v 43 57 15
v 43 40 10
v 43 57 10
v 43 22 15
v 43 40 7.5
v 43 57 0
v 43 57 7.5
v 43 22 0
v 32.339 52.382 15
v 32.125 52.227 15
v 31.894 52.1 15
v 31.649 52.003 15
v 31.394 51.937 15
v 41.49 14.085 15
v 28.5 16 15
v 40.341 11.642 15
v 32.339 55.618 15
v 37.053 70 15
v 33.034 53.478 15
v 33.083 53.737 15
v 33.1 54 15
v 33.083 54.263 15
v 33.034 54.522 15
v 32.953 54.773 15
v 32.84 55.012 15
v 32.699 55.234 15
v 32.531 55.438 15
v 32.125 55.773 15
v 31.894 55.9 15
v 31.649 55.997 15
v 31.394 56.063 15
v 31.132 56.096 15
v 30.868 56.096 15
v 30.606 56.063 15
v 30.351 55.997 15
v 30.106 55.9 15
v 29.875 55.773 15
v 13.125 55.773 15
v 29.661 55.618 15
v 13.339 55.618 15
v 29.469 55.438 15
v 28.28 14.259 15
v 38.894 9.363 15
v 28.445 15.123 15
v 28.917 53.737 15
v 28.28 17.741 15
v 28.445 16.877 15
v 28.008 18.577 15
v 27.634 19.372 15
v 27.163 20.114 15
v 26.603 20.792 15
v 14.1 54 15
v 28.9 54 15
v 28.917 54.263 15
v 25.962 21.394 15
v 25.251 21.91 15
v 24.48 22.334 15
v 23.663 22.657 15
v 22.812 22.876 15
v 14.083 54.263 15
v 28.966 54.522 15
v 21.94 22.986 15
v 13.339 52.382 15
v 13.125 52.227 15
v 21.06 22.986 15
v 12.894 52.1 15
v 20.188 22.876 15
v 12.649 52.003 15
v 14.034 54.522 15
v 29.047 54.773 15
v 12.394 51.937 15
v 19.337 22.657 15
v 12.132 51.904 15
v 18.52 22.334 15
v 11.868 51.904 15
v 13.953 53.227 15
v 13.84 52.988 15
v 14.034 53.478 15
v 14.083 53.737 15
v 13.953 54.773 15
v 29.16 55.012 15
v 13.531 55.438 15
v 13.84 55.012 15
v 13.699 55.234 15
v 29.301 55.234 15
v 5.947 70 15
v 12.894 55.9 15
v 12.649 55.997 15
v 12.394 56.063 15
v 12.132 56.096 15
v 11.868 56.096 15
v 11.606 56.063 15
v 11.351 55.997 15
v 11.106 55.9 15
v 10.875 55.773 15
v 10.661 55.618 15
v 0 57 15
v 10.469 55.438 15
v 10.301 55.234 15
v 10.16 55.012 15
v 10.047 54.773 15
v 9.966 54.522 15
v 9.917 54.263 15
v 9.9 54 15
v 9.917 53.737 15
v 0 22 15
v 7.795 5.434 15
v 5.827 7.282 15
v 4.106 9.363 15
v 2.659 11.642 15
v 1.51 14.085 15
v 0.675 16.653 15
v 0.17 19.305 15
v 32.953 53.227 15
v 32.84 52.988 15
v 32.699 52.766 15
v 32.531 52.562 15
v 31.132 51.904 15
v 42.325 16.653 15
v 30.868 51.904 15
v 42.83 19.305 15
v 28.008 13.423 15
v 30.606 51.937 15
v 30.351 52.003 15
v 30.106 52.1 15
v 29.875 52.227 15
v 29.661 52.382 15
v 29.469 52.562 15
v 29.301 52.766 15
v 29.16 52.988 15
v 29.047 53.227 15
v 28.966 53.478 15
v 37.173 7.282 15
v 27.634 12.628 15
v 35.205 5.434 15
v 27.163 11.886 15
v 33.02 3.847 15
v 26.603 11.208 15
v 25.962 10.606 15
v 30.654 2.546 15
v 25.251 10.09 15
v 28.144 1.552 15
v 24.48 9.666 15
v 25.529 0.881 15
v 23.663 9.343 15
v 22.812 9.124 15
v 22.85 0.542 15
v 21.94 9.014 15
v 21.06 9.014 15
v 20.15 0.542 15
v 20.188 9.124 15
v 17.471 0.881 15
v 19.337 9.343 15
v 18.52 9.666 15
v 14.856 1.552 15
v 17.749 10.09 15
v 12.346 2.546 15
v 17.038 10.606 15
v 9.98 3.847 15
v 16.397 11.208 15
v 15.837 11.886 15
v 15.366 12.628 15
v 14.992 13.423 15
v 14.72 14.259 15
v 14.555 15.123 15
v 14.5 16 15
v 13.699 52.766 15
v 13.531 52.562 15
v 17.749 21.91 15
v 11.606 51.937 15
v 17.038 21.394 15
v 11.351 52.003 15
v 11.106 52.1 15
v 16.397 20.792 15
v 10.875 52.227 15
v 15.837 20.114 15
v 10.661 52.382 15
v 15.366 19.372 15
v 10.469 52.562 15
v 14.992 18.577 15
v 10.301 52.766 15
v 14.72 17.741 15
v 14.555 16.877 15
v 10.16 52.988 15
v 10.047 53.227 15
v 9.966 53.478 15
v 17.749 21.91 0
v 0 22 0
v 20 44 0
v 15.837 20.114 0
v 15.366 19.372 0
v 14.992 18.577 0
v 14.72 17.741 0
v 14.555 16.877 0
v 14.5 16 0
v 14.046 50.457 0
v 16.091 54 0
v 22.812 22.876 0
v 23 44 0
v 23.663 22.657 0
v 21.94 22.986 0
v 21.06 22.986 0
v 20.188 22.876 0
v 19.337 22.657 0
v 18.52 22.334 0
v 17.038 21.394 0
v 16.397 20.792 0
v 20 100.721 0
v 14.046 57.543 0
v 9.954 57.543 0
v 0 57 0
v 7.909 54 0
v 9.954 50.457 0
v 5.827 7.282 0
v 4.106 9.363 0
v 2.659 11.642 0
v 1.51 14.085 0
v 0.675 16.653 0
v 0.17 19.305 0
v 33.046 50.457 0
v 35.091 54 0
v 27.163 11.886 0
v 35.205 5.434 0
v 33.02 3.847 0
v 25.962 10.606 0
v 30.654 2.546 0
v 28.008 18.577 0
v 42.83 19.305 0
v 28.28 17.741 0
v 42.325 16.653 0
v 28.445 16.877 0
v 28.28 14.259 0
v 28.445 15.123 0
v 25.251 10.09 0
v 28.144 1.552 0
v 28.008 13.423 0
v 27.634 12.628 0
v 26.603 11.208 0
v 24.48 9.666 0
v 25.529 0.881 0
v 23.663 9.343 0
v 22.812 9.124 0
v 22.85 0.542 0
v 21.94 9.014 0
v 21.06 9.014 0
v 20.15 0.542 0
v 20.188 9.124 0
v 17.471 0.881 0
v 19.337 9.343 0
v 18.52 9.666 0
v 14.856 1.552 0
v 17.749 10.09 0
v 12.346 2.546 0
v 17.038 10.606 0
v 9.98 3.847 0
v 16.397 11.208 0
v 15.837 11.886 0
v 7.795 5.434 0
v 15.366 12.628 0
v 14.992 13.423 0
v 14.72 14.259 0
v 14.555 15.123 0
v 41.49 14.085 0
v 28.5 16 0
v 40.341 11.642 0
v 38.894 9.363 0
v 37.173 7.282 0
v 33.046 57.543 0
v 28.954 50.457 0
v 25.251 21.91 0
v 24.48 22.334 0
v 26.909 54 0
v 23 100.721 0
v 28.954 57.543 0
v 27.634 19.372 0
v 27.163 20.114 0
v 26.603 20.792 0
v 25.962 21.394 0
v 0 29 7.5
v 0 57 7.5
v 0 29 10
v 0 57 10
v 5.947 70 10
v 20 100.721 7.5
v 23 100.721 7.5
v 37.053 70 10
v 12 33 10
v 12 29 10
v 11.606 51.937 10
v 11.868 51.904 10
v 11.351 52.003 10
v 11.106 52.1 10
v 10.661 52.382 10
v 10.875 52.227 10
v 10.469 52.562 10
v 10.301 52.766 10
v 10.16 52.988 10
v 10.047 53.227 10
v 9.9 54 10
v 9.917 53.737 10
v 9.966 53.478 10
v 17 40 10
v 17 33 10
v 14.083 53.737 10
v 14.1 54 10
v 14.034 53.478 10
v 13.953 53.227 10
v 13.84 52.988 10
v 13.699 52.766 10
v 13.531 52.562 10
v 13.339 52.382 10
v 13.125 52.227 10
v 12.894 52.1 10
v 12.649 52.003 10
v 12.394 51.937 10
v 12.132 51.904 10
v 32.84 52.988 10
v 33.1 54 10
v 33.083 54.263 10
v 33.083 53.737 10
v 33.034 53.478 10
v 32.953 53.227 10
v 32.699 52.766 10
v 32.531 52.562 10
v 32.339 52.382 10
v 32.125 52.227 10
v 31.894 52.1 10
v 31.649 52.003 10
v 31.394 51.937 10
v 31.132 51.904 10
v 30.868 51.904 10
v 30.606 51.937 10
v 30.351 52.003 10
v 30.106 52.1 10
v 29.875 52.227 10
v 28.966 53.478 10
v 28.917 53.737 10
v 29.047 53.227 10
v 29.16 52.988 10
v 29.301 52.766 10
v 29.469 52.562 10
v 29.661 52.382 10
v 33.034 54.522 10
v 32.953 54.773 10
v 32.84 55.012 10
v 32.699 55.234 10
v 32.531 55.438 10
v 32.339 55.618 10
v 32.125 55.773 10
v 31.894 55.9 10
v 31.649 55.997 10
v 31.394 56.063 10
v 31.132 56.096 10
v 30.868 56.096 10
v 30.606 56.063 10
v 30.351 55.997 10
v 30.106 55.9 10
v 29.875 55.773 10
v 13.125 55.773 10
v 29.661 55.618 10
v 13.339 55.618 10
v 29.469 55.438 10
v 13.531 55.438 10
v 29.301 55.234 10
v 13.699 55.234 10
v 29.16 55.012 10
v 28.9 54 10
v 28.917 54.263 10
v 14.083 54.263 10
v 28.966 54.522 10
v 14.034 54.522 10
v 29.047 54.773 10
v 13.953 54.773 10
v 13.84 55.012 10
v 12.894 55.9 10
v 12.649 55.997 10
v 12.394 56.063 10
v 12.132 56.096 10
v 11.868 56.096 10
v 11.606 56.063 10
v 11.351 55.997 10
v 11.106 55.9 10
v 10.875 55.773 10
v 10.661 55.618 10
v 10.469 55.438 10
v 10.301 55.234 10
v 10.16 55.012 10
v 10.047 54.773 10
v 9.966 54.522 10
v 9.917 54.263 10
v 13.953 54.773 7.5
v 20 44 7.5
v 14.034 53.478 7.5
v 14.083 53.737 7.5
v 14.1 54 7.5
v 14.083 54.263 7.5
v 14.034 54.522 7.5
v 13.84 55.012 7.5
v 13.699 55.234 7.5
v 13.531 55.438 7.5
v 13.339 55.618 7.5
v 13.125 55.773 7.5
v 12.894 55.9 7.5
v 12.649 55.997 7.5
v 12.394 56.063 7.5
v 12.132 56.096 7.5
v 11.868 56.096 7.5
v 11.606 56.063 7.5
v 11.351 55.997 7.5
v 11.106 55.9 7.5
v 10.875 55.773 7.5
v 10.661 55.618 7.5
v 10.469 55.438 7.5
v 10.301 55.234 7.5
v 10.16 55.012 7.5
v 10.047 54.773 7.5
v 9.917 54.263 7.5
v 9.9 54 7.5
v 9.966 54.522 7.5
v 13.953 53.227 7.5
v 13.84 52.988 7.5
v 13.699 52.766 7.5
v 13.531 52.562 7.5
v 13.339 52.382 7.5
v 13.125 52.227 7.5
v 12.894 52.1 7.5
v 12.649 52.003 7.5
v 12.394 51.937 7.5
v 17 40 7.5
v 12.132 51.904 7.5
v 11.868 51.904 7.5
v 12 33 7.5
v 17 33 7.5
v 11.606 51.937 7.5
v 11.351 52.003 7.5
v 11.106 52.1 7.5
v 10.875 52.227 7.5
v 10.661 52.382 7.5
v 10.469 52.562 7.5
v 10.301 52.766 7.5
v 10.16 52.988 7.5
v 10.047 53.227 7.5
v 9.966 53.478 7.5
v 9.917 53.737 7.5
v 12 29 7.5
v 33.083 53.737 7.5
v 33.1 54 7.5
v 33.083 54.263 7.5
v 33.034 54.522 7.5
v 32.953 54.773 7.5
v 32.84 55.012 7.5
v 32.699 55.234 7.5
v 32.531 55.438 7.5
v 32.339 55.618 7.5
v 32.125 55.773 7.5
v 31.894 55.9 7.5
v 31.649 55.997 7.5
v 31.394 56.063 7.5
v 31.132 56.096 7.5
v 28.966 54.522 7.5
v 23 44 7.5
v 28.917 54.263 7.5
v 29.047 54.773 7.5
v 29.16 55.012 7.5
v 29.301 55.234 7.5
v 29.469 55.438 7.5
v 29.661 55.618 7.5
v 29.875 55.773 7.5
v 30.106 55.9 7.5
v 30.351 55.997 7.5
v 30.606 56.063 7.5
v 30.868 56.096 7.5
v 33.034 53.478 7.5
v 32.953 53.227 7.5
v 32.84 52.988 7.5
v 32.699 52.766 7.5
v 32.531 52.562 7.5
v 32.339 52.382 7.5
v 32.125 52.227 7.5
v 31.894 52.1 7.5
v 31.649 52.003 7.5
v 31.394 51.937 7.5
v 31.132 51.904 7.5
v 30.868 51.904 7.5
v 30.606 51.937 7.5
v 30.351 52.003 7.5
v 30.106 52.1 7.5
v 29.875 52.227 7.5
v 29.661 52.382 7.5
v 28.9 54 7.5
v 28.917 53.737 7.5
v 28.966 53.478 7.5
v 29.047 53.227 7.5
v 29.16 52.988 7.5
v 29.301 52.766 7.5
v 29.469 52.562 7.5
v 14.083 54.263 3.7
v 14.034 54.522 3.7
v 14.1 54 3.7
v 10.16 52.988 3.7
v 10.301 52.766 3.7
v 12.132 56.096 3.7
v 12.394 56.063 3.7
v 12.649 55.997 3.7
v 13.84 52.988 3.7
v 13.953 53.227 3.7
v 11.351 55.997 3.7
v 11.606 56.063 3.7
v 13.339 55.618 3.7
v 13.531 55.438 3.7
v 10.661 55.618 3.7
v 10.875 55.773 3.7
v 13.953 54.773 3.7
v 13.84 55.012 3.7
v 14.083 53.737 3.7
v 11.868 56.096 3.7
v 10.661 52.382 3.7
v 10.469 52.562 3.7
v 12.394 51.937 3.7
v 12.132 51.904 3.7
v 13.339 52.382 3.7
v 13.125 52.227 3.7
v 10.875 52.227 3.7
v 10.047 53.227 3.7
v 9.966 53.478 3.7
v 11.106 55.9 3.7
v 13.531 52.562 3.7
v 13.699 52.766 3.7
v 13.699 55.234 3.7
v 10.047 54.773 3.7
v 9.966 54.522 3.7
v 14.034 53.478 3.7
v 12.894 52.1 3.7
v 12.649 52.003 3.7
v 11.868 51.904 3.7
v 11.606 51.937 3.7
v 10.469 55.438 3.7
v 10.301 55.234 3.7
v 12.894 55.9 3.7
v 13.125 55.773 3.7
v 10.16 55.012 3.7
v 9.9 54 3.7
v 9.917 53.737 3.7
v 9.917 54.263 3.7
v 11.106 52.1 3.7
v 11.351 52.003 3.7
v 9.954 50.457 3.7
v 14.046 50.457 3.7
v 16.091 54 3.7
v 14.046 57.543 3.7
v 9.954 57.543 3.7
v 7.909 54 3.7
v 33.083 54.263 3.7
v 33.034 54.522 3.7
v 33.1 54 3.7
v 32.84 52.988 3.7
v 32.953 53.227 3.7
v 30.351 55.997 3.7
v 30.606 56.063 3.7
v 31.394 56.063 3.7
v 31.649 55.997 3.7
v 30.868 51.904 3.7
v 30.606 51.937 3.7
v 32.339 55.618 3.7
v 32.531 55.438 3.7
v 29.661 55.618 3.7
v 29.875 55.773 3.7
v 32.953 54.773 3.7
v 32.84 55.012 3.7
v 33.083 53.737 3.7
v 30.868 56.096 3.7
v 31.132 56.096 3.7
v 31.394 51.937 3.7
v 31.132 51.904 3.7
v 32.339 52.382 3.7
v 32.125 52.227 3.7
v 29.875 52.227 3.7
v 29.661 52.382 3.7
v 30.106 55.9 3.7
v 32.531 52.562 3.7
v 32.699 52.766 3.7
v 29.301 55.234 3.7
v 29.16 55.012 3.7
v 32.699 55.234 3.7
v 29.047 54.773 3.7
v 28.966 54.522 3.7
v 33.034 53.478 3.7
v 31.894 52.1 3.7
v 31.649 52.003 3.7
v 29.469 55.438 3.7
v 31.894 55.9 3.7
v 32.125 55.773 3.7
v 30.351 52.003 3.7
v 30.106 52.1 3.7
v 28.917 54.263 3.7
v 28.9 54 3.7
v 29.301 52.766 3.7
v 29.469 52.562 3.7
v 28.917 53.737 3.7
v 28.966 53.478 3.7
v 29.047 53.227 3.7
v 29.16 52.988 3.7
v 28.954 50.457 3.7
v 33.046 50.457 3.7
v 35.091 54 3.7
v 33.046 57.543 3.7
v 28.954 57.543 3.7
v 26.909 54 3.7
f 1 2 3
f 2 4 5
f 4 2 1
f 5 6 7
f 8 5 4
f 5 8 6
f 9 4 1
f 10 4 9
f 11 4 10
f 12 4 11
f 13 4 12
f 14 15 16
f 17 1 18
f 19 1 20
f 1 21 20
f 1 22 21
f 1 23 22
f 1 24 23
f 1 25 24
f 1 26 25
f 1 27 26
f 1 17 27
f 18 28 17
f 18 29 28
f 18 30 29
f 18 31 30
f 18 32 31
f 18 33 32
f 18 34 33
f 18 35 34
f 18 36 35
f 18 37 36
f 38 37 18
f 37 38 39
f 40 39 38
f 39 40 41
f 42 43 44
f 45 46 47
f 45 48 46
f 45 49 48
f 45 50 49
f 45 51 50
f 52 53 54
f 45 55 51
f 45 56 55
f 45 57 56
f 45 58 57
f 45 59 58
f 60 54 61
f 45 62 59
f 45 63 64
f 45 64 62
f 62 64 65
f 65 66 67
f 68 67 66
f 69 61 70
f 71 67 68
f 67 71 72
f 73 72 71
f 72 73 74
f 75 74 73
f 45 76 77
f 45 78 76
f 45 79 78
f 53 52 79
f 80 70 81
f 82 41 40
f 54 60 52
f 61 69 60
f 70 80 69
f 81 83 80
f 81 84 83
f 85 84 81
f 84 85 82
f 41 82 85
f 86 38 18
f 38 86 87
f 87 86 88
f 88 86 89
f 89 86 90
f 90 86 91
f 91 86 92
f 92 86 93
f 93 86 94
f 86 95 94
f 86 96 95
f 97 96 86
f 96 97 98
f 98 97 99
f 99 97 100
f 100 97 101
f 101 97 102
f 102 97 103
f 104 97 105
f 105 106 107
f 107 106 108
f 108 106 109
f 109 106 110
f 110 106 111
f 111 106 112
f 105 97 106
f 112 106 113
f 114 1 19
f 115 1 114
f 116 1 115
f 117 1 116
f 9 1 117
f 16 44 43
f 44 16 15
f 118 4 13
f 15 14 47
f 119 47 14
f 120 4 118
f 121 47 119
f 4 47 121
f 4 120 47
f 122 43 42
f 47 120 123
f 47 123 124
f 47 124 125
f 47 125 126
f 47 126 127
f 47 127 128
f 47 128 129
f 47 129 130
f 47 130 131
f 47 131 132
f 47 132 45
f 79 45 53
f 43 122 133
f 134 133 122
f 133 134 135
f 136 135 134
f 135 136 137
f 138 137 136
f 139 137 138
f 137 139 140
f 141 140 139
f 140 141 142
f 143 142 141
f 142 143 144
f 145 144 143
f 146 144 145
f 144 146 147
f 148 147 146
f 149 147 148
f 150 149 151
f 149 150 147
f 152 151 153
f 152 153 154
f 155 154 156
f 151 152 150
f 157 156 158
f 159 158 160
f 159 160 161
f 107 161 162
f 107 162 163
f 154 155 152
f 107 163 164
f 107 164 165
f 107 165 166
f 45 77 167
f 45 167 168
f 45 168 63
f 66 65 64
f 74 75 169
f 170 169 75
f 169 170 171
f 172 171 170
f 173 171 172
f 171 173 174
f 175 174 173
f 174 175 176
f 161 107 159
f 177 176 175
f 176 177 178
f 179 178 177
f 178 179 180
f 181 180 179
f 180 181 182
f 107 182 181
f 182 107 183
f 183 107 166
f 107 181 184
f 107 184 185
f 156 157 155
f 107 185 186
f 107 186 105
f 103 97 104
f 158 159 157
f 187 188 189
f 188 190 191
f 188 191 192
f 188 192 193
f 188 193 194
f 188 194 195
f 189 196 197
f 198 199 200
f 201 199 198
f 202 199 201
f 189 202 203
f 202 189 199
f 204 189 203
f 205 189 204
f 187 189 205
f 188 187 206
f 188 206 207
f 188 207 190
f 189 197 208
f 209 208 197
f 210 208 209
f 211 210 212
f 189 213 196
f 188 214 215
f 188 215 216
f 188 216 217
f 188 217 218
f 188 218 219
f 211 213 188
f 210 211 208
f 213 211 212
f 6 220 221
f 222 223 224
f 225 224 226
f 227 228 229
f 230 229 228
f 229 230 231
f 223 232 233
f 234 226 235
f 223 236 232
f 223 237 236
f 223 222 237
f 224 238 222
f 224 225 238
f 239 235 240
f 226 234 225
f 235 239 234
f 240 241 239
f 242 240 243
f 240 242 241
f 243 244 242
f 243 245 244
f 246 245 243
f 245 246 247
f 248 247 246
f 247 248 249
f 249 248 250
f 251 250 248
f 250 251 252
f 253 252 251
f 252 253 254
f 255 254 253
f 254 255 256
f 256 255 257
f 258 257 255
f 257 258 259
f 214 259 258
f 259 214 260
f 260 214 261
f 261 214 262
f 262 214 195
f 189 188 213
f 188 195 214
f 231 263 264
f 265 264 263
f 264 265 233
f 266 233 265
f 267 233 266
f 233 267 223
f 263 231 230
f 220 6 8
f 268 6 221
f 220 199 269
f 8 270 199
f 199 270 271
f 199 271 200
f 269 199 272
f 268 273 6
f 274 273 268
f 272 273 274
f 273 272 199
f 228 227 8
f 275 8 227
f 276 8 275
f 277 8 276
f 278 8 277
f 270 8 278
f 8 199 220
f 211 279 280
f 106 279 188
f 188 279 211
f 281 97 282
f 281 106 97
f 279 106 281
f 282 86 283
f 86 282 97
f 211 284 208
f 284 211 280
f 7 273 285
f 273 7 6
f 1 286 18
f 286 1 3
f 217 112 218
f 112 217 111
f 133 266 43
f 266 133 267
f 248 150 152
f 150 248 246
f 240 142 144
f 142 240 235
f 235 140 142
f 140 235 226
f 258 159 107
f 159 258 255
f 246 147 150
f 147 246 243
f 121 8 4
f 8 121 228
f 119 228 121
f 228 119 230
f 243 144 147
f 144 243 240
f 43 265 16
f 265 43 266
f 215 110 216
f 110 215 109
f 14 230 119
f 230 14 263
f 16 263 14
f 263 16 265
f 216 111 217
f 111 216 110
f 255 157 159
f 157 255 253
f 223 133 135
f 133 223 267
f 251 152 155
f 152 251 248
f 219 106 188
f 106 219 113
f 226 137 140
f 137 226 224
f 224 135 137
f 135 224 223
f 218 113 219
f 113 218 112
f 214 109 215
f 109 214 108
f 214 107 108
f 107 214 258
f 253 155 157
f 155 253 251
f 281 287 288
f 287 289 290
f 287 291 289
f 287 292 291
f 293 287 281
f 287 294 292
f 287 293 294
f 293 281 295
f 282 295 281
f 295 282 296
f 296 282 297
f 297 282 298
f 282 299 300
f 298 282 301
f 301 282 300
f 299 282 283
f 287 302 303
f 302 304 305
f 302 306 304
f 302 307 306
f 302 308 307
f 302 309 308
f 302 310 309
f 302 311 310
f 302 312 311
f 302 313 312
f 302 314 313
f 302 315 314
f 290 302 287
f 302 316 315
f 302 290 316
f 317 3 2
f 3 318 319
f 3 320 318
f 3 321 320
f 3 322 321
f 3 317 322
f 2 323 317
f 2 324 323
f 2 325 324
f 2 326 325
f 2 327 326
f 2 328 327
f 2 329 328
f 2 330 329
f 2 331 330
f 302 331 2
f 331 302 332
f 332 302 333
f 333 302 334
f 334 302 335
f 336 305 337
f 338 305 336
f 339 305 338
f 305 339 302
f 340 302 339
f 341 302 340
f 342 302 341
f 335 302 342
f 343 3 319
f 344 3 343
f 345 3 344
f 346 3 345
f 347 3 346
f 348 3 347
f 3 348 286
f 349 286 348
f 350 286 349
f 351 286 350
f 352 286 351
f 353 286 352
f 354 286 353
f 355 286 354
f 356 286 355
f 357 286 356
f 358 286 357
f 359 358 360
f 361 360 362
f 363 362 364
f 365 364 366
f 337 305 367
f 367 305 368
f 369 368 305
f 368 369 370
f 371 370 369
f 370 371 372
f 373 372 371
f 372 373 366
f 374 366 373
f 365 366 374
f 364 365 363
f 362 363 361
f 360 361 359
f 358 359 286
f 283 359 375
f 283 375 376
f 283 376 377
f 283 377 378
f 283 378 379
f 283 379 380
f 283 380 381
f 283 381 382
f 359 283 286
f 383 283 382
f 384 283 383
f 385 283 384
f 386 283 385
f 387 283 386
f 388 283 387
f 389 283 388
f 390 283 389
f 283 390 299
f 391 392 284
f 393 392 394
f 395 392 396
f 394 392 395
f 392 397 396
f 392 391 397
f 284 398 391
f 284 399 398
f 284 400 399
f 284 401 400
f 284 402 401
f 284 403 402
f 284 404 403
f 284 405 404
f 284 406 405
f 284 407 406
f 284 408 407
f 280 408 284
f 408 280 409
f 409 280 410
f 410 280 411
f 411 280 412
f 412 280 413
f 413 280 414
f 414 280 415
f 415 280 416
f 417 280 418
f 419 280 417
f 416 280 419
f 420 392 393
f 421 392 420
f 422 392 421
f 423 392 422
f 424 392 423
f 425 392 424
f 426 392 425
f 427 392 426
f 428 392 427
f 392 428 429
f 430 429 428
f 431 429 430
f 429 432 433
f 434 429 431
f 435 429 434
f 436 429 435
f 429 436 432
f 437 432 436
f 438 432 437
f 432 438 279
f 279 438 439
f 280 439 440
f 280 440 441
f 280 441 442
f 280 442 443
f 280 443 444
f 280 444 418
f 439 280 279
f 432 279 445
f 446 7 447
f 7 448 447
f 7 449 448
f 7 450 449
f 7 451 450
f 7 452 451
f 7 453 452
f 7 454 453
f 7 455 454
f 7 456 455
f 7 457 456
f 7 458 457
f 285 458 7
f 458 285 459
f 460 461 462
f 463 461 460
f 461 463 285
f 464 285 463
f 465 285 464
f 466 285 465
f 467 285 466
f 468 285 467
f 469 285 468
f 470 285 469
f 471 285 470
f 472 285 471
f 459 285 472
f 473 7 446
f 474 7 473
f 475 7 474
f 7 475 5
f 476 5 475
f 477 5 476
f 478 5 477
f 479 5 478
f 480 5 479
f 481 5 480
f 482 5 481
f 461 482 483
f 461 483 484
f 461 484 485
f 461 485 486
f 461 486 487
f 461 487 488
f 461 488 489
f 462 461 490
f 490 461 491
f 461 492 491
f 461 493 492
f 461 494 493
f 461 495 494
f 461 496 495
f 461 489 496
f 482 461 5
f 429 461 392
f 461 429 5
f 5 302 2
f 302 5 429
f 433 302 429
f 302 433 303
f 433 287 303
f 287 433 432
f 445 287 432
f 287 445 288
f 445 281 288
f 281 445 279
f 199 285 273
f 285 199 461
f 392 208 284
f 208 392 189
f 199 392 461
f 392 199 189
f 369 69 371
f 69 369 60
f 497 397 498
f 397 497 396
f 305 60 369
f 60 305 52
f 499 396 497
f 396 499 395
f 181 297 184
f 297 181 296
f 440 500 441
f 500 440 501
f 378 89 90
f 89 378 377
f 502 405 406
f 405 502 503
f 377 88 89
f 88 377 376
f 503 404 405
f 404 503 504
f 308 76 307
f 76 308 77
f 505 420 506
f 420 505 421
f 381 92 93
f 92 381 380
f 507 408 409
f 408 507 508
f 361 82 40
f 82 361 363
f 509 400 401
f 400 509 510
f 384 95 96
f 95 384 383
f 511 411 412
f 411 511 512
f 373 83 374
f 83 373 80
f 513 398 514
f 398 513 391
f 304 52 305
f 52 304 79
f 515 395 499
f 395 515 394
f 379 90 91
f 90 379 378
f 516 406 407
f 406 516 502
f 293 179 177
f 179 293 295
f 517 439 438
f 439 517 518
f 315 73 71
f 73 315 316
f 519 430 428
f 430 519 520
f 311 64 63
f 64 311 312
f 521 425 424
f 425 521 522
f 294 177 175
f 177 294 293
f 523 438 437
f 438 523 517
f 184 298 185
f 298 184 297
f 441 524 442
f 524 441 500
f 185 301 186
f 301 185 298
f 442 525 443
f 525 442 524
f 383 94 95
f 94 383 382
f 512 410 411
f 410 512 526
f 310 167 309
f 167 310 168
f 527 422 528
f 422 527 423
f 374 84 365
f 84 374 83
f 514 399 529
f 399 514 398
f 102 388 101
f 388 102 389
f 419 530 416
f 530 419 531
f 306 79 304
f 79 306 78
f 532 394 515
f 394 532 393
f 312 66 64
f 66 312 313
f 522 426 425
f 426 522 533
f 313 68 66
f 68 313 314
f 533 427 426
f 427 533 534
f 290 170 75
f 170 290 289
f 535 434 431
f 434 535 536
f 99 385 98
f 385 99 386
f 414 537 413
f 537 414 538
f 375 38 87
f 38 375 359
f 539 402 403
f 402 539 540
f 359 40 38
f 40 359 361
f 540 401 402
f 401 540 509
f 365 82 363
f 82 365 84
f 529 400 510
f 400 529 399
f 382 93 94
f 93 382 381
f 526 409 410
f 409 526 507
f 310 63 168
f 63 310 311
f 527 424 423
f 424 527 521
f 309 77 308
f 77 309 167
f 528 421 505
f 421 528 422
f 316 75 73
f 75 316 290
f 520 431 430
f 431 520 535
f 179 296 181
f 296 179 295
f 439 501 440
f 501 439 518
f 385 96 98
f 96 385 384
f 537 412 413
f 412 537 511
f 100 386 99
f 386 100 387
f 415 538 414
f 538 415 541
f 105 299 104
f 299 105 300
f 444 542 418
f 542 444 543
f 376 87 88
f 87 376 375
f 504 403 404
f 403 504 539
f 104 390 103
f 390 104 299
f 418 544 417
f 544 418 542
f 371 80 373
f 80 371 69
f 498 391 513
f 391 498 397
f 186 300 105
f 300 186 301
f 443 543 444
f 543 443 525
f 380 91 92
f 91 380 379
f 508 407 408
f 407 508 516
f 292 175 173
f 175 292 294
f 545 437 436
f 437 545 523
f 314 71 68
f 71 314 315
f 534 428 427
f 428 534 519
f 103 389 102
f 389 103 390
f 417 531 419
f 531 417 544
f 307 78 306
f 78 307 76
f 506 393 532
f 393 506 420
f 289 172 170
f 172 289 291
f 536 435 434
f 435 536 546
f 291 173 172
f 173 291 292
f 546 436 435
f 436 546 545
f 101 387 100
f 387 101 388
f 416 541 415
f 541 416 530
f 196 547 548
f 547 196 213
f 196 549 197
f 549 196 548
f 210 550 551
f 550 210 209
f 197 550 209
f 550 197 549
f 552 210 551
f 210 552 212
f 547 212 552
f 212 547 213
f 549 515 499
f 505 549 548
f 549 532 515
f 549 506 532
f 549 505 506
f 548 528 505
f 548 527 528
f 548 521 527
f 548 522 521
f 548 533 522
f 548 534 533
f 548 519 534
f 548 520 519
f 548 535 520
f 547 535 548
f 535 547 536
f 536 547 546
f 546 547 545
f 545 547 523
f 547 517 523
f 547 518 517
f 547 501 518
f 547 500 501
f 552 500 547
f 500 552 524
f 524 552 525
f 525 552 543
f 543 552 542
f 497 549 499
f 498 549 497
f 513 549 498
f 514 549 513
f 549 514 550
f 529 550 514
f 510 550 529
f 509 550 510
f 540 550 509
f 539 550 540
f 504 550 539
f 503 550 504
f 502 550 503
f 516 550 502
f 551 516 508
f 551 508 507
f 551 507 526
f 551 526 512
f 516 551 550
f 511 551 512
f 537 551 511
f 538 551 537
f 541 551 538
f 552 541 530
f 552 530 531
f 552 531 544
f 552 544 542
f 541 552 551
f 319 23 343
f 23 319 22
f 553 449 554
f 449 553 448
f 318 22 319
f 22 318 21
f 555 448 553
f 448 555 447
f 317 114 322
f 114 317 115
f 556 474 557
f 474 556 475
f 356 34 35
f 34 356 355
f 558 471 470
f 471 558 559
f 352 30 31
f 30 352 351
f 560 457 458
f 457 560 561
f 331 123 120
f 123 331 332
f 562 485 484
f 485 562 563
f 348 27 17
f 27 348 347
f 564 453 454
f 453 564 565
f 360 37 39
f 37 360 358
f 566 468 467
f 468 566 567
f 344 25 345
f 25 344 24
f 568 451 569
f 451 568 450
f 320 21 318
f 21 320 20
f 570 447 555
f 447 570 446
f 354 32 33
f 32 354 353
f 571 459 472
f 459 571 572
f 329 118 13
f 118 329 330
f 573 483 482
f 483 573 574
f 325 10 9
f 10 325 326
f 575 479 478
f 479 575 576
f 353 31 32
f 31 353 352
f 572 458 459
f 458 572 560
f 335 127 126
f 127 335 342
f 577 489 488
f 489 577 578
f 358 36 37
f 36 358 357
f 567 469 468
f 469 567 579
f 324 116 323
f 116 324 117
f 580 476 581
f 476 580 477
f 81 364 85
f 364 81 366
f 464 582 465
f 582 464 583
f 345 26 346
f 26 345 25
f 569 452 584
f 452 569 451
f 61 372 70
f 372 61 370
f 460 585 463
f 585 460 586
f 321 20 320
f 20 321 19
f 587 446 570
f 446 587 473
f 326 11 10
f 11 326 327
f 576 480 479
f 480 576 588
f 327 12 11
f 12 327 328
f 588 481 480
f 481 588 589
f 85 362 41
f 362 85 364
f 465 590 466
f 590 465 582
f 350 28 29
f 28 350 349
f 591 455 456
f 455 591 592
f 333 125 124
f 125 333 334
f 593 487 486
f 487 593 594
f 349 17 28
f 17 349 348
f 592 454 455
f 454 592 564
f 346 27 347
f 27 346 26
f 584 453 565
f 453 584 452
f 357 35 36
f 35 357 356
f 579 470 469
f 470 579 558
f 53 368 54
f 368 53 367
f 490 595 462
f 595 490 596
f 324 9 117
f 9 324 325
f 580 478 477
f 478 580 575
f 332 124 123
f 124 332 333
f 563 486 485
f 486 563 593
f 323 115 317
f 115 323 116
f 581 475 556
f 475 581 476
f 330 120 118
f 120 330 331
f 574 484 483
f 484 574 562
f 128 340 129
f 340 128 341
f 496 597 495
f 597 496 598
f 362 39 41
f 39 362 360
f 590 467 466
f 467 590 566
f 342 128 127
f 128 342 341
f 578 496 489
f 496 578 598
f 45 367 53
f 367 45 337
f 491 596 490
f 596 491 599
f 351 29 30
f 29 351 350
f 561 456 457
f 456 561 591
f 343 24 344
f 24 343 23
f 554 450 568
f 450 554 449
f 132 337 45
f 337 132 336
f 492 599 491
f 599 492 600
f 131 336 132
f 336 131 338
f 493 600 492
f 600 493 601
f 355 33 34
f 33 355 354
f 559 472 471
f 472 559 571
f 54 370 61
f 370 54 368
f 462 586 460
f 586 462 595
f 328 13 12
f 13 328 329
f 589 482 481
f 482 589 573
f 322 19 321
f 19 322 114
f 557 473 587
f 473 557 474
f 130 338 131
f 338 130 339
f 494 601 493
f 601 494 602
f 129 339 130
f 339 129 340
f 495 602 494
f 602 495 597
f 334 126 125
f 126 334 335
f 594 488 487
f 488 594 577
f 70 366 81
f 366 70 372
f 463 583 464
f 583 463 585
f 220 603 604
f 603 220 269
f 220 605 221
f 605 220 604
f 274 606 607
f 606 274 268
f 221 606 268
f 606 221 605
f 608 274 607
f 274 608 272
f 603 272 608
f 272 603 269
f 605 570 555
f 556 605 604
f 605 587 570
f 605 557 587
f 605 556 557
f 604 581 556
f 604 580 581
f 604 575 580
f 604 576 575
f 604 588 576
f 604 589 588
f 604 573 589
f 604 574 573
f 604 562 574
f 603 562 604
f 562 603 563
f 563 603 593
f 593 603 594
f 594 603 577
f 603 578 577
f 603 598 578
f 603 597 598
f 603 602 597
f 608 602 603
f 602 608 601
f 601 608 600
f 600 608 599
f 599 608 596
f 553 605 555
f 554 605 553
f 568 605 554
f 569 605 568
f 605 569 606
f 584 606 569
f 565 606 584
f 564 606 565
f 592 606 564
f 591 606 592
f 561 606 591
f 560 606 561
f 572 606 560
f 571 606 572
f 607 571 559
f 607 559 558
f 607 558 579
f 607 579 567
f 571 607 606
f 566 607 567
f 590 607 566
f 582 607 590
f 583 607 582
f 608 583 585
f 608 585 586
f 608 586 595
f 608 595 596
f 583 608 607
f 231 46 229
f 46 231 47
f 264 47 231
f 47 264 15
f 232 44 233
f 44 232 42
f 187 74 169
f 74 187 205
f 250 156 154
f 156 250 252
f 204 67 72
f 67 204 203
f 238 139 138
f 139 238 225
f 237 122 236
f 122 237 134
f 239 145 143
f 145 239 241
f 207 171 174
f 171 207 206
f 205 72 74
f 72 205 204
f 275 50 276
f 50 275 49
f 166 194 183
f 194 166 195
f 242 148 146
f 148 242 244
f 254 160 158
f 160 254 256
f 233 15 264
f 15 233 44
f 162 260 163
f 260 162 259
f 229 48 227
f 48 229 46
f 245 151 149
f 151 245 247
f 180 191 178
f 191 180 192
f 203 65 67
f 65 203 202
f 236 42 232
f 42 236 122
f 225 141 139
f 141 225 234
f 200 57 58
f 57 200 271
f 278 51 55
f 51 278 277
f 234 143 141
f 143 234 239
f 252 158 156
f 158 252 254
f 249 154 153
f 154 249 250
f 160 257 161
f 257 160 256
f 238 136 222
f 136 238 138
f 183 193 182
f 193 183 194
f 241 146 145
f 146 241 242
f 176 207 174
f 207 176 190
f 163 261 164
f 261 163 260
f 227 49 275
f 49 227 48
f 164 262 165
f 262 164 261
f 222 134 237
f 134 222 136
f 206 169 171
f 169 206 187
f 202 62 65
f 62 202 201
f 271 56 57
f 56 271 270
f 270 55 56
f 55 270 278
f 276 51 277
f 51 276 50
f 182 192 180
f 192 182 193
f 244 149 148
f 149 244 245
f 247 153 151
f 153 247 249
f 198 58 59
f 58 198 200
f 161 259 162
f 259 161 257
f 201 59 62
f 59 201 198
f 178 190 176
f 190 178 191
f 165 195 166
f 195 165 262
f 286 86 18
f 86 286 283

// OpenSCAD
height = 15;


difference() {
    union(){
        translate([0,22,0]) {
            cube([43,35,height]);
        }
        polyhedron(
           points=[[0,57,0], [21.5,57,0], [21.5,104,0], [21.5,104,height], [0,57,height], [21.5,57,height]],
           faces=[[2,0,1], [4,5,1,0], [1,5,3,2], [3,5,4], [0,2,3,4]]
        );
        polyhedron(
           points=[[43,57,0], [21.5,57,0], [21.5,104,0], [21.5,104,height], [43,57,height], [21.5,57,height]],
           faces=[[1,0,2], [0,1,5,4], [2,3,5,1], [4,5,3], [4,3,2,0]]
        );
        translate([21.5,22,0]) {
            cylinder(h=height, r=21.5, $fn=50);
        }
    }
    translate([0, 44, 0]) {
        translate([20,0,0]) {
            cube([3, 70, (height/2) + 2]);
        }
        translate([0,-4,(height/2)]) {
            cube([45, 70, 2.5]);
            translate([0,-7,0]) {
                cube([17, 22, 2.5]);
            }
            translate([0,-11,0]) {
                cube([12, 22, 2.5]);
            }
        }
    }
    translate([21.5,16,0]) {
        cylinder(h=height, d=14, $fn=50);
    }
    translate([0,54,0]) {
        translate([12,0,0]) {
            cylinder(h=height, d=4.2, $fn=50);
            nut_trap(w = 7, h = 3.7);
        }
        translate([31,0,0]) {
            cylinder(h=height, d=4.2, $fn=50);
            nut_trap(w = 7, h = 3.7);
        }
    }
    translate([0,70,(height/2)]) {
        cube([45, 45, 10]);
    }
}
module nut_trap (
        w = 5.5,
        h = 3
        )
{
        cylinder(r = w / 2 / cos(180 / 6) + 0.05, h=h, $fn=6);
} 
